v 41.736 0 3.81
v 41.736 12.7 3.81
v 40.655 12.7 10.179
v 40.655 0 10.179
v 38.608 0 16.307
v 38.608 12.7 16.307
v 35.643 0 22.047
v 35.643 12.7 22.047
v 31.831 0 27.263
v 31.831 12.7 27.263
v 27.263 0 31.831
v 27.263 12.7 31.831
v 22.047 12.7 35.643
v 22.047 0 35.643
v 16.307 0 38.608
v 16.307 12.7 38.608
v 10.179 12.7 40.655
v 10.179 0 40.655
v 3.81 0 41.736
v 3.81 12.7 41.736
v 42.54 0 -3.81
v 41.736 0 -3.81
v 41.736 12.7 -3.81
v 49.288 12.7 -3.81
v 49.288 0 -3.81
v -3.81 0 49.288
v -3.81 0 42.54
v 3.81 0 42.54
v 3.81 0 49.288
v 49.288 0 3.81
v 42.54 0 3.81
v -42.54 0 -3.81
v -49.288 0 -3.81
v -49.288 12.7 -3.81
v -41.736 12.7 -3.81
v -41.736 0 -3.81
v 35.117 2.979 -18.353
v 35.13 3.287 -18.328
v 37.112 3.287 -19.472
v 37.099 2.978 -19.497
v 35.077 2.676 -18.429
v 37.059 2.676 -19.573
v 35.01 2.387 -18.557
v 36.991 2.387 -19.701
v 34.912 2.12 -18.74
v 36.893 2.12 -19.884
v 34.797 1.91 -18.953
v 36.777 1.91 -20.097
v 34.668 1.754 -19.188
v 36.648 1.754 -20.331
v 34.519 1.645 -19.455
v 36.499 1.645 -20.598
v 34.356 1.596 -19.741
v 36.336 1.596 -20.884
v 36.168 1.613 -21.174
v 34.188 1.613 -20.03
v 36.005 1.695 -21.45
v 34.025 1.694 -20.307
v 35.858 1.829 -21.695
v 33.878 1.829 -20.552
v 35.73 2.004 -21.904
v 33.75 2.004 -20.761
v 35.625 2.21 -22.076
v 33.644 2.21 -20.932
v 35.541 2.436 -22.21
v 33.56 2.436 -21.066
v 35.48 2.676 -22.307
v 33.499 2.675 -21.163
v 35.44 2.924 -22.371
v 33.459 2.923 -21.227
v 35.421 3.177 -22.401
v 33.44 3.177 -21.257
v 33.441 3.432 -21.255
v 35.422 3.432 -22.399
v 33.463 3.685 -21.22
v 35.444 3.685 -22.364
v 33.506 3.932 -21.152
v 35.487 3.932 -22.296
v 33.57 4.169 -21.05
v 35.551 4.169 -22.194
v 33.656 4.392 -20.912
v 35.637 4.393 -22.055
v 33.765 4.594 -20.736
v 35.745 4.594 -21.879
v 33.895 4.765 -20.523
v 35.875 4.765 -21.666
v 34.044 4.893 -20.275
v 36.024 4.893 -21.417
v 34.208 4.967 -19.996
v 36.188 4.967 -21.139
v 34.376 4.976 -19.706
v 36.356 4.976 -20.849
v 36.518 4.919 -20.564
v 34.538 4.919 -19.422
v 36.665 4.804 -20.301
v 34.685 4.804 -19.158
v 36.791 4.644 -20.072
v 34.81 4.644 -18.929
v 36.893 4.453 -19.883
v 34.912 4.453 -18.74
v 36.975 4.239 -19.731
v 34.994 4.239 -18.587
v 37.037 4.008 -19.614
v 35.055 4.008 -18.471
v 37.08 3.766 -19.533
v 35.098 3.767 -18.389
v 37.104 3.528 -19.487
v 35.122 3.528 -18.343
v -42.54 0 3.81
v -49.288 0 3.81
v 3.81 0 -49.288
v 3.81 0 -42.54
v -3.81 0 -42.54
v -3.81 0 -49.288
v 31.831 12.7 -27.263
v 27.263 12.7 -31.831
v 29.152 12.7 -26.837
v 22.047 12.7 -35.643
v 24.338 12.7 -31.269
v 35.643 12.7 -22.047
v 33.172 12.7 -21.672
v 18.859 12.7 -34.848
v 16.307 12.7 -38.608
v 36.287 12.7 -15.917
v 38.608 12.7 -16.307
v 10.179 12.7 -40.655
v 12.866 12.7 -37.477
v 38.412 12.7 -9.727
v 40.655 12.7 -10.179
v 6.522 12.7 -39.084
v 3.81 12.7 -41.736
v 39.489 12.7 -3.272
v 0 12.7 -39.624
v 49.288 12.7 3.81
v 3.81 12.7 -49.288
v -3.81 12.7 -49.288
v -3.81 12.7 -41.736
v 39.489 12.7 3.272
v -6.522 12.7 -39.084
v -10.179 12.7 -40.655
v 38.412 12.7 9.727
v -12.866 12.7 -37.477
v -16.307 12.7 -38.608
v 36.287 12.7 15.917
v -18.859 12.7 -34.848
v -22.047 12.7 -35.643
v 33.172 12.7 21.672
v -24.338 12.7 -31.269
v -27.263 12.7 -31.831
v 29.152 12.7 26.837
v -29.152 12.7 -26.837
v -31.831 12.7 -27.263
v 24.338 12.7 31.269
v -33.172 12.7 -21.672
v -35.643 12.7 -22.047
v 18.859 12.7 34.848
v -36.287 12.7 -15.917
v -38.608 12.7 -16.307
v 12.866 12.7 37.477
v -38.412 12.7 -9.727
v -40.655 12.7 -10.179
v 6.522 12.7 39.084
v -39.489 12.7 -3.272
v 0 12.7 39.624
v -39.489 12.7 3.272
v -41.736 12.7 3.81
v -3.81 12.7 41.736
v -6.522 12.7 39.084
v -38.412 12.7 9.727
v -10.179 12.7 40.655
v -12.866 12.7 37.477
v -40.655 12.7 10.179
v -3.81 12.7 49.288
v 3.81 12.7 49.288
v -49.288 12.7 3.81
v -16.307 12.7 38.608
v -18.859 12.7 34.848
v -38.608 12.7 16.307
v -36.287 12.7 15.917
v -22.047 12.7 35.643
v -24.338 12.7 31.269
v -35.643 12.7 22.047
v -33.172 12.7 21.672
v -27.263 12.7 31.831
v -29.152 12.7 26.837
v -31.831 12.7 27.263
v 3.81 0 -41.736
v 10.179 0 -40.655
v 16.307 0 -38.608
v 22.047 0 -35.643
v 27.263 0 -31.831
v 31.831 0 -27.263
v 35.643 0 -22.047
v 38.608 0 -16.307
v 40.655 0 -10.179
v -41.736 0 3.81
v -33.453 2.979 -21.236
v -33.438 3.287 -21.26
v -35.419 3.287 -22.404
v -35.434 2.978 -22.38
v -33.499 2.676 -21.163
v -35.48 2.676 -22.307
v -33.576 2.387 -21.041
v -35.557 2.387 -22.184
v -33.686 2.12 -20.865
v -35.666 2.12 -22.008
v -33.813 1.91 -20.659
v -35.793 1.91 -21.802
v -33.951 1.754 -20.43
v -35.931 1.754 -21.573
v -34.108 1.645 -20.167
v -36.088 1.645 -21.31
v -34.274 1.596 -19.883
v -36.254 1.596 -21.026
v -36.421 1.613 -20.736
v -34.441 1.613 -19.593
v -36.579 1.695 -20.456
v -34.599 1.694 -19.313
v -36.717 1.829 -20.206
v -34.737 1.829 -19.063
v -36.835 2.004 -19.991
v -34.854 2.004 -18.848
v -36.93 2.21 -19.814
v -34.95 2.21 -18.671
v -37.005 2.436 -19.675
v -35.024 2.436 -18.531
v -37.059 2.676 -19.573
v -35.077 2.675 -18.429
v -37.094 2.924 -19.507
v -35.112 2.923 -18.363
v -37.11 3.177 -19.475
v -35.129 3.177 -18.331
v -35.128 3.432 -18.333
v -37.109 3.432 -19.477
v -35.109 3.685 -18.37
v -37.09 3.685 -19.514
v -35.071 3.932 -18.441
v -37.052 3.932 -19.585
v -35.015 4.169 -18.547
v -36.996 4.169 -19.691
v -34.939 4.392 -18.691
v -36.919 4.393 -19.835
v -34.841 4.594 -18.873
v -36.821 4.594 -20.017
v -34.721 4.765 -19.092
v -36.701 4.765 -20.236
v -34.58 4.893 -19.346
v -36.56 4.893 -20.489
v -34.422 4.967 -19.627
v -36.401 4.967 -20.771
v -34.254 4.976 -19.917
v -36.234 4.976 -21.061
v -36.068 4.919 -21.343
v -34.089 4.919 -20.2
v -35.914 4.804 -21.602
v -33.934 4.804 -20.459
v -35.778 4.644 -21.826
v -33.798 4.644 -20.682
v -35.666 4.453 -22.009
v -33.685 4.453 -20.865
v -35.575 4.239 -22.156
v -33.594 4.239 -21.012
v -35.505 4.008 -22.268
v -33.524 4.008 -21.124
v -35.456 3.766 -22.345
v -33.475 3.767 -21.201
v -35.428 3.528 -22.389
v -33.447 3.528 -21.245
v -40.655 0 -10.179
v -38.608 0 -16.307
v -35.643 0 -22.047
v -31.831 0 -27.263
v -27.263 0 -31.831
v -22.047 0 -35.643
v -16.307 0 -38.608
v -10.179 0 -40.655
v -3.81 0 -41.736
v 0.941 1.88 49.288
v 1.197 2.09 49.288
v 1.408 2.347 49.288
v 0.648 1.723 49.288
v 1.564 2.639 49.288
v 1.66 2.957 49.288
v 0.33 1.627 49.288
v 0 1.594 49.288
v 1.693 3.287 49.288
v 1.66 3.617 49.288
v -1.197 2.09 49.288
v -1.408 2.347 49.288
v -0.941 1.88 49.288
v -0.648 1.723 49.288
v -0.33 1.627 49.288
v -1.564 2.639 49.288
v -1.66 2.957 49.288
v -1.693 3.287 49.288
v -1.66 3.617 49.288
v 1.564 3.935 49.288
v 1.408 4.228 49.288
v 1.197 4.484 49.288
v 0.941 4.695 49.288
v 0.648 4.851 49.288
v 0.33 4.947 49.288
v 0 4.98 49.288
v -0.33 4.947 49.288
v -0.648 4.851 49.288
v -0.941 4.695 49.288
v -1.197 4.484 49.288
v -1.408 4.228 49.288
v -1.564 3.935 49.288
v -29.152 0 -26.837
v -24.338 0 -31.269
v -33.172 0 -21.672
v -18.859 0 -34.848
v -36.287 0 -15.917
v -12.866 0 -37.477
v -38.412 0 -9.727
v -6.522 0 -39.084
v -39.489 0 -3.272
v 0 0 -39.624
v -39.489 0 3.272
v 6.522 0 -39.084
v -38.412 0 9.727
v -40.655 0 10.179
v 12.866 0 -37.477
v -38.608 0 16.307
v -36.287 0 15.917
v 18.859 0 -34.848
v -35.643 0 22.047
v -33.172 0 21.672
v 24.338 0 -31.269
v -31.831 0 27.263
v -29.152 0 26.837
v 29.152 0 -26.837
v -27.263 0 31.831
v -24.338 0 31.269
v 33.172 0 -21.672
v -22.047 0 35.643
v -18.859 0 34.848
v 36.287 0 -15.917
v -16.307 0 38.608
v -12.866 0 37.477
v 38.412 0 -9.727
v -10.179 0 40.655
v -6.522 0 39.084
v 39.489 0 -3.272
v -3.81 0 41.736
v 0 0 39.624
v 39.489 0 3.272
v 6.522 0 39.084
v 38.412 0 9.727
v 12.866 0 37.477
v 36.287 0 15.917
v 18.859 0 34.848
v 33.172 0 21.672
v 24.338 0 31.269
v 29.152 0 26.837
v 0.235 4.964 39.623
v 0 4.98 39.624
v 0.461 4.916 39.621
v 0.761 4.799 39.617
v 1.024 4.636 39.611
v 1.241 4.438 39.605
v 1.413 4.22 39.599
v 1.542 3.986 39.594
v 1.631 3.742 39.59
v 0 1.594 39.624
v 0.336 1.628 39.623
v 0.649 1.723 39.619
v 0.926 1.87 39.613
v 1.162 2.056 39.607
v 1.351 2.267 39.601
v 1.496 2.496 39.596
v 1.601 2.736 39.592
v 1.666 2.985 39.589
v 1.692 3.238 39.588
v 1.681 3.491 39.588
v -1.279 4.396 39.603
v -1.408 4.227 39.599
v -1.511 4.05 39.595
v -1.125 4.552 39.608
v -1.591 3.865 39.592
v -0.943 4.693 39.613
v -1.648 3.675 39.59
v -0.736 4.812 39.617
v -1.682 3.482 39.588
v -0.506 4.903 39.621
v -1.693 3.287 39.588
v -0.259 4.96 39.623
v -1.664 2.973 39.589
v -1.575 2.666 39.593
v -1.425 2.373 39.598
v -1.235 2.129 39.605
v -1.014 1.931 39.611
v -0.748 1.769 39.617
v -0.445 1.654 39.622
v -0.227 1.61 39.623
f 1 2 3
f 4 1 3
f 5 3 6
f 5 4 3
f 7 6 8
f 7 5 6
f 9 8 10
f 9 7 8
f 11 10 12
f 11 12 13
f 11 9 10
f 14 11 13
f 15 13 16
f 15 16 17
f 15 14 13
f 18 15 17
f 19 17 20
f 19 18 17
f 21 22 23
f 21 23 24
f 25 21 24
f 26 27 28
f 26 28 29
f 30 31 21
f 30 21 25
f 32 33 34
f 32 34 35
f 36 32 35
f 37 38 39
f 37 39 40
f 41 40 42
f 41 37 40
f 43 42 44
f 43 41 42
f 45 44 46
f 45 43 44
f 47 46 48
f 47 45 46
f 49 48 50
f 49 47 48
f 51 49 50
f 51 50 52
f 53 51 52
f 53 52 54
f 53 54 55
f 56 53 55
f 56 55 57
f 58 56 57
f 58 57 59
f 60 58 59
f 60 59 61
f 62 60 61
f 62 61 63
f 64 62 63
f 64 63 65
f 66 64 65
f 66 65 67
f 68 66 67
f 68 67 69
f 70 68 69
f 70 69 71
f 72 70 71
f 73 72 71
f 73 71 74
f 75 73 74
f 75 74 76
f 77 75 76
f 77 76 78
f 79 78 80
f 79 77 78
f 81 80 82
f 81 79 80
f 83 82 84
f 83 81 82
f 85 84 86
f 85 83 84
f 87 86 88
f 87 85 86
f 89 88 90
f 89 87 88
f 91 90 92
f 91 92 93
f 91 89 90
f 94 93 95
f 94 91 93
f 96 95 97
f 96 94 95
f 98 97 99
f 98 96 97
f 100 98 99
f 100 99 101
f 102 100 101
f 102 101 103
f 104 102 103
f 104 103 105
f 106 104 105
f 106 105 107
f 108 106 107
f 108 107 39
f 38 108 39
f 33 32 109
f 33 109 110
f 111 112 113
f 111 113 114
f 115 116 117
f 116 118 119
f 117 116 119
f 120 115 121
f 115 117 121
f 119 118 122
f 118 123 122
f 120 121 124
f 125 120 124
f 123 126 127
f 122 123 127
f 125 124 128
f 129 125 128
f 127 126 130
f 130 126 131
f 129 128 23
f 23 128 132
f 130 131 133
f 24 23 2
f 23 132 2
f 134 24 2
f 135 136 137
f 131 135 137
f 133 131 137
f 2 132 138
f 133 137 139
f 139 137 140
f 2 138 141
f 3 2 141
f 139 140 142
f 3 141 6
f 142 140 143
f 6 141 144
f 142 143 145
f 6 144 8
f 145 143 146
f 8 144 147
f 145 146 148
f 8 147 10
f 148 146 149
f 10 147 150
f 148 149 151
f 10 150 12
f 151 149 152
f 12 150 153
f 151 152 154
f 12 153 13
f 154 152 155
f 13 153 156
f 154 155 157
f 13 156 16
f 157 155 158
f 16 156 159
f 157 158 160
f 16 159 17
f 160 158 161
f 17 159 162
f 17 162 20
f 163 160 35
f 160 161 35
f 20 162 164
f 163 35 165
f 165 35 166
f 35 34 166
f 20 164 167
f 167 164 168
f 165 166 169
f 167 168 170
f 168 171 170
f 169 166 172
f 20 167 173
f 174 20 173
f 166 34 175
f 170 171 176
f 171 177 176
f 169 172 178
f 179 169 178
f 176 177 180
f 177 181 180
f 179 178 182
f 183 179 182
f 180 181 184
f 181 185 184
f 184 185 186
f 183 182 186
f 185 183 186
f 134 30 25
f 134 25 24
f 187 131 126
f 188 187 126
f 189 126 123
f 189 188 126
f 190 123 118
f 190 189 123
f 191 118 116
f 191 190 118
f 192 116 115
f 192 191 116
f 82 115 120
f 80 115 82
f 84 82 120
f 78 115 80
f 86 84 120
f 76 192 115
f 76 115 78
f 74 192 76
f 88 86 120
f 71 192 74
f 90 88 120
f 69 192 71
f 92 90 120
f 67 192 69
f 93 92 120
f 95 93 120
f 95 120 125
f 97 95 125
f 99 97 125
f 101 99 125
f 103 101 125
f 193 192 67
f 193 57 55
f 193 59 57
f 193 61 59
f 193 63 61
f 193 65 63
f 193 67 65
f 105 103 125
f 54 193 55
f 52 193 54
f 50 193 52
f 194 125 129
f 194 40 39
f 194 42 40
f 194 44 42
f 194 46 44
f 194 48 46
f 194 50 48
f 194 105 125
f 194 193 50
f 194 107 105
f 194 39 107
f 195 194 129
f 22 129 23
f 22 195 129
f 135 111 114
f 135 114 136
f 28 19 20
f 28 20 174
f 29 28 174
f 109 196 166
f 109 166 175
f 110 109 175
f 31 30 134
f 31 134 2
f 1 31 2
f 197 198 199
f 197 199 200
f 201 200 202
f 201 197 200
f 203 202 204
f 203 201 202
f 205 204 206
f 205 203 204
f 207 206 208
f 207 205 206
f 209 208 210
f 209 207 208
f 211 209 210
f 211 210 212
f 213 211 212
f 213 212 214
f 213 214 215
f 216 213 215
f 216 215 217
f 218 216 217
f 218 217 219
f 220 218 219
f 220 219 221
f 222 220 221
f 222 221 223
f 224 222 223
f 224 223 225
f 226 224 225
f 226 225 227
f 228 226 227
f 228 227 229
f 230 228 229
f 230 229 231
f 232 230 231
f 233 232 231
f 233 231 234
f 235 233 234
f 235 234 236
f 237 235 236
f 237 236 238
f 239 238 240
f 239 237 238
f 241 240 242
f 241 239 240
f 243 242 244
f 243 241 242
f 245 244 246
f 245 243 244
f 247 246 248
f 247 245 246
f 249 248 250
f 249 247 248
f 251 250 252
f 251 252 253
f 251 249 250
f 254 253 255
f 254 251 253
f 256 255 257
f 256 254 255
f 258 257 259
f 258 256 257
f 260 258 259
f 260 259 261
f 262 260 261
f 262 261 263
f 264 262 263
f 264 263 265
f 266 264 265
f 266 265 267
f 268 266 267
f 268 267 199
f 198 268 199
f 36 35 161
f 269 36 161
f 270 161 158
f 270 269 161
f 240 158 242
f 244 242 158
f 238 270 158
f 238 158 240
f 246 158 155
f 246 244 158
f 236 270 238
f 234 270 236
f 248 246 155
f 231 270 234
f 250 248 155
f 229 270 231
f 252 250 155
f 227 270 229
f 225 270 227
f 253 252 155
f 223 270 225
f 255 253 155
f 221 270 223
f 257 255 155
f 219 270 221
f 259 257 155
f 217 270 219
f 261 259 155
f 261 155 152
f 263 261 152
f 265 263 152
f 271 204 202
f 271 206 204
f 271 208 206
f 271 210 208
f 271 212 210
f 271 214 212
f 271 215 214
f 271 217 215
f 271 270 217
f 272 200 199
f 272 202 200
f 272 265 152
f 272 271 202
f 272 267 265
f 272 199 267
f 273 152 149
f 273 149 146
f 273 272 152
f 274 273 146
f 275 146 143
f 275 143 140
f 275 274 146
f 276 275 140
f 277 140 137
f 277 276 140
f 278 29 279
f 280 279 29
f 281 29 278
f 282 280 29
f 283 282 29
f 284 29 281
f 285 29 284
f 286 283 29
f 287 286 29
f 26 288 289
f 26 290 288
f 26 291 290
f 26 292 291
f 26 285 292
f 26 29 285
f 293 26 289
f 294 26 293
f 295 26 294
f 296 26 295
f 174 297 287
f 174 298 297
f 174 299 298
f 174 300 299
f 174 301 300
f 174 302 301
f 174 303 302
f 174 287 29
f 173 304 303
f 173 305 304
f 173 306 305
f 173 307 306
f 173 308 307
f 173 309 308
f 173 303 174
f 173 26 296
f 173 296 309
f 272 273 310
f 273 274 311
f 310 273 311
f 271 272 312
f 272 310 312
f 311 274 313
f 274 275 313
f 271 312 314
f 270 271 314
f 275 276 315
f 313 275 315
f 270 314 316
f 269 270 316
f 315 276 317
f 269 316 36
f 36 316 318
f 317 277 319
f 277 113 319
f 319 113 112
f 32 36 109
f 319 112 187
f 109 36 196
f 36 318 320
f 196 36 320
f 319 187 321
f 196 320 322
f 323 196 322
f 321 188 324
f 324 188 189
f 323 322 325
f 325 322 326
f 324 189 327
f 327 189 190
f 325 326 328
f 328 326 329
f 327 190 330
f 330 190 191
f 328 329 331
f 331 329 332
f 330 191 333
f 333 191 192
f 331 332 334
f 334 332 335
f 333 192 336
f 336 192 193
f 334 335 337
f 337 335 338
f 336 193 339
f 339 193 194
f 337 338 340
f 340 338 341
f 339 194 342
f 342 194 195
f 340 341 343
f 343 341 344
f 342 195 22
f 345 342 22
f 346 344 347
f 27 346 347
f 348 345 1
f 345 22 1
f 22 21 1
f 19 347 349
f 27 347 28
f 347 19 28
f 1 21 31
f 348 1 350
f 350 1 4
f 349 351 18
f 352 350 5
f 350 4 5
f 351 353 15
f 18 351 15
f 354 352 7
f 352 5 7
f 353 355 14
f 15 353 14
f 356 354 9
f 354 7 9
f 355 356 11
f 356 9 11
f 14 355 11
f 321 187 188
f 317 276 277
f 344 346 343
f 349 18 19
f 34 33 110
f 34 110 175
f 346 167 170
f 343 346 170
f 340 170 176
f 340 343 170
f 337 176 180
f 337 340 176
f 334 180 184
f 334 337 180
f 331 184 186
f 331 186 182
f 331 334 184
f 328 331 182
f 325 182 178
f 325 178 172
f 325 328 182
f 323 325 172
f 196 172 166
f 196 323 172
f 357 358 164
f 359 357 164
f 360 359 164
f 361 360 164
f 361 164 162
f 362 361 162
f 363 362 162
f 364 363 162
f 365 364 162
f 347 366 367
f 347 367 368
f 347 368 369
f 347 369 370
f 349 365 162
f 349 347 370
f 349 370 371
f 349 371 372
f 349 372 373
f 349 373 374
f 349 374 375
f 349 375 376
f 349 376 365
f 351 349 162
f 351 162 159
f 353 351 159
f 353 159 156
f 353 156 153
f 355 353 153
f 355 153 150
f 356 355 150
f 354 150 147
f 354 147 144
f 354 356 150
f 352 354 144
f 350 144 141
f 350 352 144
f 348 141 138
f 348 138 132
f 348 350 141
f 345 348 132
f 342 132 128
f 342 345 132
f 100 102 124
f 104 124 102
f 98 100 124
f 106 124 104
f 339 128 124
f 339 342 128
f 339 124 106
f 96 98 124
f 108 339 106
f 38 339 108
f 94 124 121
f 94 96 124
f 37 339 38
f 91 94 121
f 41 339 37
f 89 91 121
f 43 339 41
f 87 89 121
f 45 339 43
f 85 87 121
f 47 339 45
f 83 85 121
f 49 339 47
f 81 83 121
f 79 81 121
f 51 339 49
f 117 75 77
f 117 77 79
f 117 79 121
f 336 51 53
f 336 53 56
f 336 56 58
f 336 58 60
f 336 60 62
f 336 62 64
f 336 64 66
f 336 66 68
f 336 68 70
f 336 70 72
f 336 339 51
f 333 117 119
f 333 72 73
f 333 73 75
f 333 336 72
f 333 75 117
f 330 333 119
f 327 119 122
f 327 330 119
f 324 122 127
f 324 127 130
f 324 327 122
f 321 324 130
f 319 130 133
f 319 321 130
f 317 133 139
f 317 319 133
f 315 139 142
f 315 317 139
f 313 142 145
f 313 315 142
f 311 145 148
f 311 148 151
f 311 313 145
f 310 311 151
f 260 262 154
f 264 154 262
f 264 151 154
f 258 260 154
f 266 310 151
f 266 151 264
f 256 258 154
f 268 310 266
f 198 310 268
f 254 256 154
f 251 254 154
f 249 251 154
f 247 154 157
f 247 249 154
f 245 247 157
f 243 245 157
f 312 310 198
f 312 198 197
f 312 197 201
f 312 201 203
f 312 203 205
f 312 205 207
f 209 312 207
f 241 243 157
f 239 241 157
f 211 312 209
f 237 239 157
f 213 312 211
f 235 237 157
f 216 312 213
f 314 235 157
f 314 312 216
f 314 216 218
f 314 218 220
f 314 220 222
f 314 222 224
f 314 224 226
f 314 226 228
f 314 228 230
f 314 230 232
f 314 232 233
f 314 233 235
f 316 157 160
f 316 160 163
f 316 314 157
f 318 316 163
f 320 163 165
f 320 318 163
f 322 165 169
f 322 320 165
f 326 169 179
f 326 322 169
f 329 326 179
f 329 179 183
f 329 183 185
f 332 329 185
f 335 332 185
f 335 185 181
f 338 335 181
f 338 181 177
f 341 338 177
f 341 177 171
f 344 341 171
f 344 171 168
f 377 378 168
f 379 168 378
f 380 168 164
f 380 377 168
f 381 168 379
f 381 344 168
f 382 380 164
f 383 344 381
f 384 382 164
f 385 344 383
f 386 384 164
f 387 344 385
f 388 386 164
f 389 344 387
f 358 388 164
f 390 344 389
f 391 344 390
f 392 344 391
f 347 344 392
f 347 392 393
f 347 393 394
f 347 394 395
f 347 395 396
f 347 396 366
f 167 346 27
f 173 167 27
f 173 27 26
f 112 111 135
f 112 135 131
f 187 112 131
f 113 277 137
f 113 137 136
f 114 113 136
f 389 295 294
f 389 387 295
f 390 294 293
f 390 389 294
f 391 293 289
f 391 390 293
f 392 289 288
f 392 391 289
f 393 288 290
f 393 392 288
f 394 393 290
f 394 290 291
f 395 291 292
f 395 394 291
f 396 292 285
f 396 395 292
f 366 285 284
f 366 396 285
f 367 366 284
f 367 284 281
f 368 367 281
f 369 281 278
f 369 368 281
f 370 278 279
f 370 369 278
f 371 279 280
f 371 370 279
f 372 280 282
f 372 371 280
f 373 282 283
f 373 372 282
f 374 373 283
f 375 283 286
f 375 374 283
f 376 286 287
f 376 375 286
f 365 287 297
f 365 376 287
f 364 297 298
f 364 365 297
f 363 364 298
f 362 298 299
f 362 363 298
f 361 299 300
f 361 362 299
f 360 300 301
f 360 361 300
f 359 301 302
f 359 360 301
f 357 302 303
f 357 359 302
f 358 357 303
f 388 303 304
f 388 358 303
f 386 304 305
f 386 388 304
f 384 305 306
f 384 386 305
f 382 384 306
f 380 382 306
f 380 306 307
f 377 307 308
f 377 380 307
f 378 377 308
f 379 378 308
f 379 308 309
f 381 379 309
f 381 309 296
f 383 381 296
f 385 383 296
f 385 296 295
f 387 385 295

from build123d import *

# Parameters (mm, degrees)
SKETCH1_R           = 42.9384162
SKETCH1_R_2         = 39.624
BOSS_EXTRUDE1_DEPTH = 12.7
SKETCH4_R           = 1.692869147
CUT_EXTRUDE1_DEPTH  = 72.35
CIRPATTERN7_COUNT   = 3
SKETCH6_W           = 6.747965948
SKETCH6_H           = 12.700002404
BOSS_EXTRUDE2_DEPTH = 3.81
CIRPATTERN8_COUNT   = 4
CUT_EXTRUDE2_START  = -8.81
SKETCH7_R           = 1.692869147
CUT_EXTRUDE2_DEPTH  = 8.81
CUT_EXTRUDE3_START  = -24
CUT_EXTRUDE3_DEPTH  = 24


with BuildPart() as part:
    # Sketch1 → Boss-Extrude1 (new body)
    with BuildSketch(Plane(origin=(0, 0, 0), x_dir=(1, 0, 0), z_dir=(0, 1, 0))):
        with Locations(Location((0, 0, 0), (0, 0, 270))):
            Circle(SKETCH1_R)
        with Locations(Location((0, 0, 0), (0, 0, 270))):
            Circle(SKETCH1_R_2, mode=Mode.SUBTRACT)
    extrude(amount=BOSS_EXTRUDE1_DEPTH)

    # Sketch4 → Cut-Extrude1 (cut)
    with BuildSketch(Plane.XY):
        with Locations(Location((0, 3.287142885, 0), (0, 0, 180))):
            Circle(SKETCH4_R)
    cut_extrude1 = extrude(amount=CUT_EXTRUDE1_DEPTH, mode=Mode.SUBTRACT)

    # CirPattern7: Cut-Extrude1 ×3 about axis
    cirpattern7_axis = Axis((0, 0, 0), (0, -1, 0))
    for i in range(1, CIRPATTERN7_COUNT):
        add(cut_extrude1.rotate(cirpattern7_axis, i * 360 / CIRPATTERN7_COUNT), mode=Mode.SUBTRACT)

    # Sketch6 → Boss-Extrude2 (add, symmetric)
    with BuildSketch(Plane.XY):
        with Locations((45.914433226, 6.349998798)):
            Rectangle(SKETCH6_W, SKETCH6_H)
    boss_extrude2 = extrude(amount=BOSS_EXTRUDE2_DEPTH, both=True)

    # CirPattern8: Boss-Extrude2 ×4 about axis
    cirpattern8_axis = Axis((0, 0, 0), (0, 1, 0))
    for i in range(1, CIRPATTERN8_COUNT):
        add(boss_extrude2.rotate(cirpattern8_axis, i * 360 / CIRPATTERN8_COUNT))

    # Sketch7 → Cut-Extrude2 (cut)
    with BuildSketch(Plane.XY.offset(49.2884162).offset(CUT_EXTRUDE2_START)):
        with Locations(Location((0, 3.287142885, 0), (0, 0, 180))):
            Circle(SKETCH7_R)
    extrude(amount=CUT_EXTRUDE2_DEPTH, mode=Mode.SUBTRACT)

    # Sketch8 → Cut-Extrude3 (cut)
    with BuildSketch(Plane(origin=(0, 12.7, 0), x_dir=(1, 0, 0), z_dir=(0, 1, 0)).offset(CUT_EXTRUDE3_START)):
        with BuildLine():
            Line((-41.736458882, -3.81), (-42.769048222, -3.81))
            ThreePointArc((-42.769048222, -3.81), (-30.362045269, -30.362045269), (-3.81, -42.769048222))
            Line((-3.81, -42.769048222), (-3.81, -41.736458882))
            ThreePointArc((-3.81, -41.736458882), (-29.6348452, -29.6348452), (-41.736458882, -3.81))
        make_face()
        with BuildLine():
            Line((3.81, -41.736458882), (3.81, -42.769048222))
            ThreePointArc((3.81, -42.769048222), (30.362045269, -30.362045269), (42.769048222, -3.81))
            Line((42.769048222, -3.81), (41.736458882, -3.81))
            ThreePointArc((41.736458882, -3.81), (29.6348452, -29.6348452), (3.81, -41.736458882))
        make_face()
        with BuildLine():
            ThreePointArc((42.769048222, 3.81), (30.362045269, 30.362045269), (3.81, 42.769048222))
            Line((3.81, 42.769048222), (3.81, 41.736458882))
            ThreePointArc((3.81, 41.736458882), (29.6348452, 29.6348452), (41.736458882, 3.81))
            Line((41.736458882, 3.81), (42.769048222, 3.81))
        make_face()
        with BuildLine():
            ThreePointArc((-3.81, 42.769048222), (-30.362045269, 30.362045269), (-42.769048222, 3.81))
            Line((-42.769048222, 3.81), (-41.736458882, 3.81))
            ThreePointArc((-41.736458882, 3.81), (-29.6348452, 29.6348452), (-3.81, 41.736458882))
            Line((-3.81, 41.736458882), (-3.81, 42.769048222))
        make_face()
    extrude(amount=CUT_EXTRUDE3_DEPTH, mode=Mode.SUBTRACT)


solid = part.part
